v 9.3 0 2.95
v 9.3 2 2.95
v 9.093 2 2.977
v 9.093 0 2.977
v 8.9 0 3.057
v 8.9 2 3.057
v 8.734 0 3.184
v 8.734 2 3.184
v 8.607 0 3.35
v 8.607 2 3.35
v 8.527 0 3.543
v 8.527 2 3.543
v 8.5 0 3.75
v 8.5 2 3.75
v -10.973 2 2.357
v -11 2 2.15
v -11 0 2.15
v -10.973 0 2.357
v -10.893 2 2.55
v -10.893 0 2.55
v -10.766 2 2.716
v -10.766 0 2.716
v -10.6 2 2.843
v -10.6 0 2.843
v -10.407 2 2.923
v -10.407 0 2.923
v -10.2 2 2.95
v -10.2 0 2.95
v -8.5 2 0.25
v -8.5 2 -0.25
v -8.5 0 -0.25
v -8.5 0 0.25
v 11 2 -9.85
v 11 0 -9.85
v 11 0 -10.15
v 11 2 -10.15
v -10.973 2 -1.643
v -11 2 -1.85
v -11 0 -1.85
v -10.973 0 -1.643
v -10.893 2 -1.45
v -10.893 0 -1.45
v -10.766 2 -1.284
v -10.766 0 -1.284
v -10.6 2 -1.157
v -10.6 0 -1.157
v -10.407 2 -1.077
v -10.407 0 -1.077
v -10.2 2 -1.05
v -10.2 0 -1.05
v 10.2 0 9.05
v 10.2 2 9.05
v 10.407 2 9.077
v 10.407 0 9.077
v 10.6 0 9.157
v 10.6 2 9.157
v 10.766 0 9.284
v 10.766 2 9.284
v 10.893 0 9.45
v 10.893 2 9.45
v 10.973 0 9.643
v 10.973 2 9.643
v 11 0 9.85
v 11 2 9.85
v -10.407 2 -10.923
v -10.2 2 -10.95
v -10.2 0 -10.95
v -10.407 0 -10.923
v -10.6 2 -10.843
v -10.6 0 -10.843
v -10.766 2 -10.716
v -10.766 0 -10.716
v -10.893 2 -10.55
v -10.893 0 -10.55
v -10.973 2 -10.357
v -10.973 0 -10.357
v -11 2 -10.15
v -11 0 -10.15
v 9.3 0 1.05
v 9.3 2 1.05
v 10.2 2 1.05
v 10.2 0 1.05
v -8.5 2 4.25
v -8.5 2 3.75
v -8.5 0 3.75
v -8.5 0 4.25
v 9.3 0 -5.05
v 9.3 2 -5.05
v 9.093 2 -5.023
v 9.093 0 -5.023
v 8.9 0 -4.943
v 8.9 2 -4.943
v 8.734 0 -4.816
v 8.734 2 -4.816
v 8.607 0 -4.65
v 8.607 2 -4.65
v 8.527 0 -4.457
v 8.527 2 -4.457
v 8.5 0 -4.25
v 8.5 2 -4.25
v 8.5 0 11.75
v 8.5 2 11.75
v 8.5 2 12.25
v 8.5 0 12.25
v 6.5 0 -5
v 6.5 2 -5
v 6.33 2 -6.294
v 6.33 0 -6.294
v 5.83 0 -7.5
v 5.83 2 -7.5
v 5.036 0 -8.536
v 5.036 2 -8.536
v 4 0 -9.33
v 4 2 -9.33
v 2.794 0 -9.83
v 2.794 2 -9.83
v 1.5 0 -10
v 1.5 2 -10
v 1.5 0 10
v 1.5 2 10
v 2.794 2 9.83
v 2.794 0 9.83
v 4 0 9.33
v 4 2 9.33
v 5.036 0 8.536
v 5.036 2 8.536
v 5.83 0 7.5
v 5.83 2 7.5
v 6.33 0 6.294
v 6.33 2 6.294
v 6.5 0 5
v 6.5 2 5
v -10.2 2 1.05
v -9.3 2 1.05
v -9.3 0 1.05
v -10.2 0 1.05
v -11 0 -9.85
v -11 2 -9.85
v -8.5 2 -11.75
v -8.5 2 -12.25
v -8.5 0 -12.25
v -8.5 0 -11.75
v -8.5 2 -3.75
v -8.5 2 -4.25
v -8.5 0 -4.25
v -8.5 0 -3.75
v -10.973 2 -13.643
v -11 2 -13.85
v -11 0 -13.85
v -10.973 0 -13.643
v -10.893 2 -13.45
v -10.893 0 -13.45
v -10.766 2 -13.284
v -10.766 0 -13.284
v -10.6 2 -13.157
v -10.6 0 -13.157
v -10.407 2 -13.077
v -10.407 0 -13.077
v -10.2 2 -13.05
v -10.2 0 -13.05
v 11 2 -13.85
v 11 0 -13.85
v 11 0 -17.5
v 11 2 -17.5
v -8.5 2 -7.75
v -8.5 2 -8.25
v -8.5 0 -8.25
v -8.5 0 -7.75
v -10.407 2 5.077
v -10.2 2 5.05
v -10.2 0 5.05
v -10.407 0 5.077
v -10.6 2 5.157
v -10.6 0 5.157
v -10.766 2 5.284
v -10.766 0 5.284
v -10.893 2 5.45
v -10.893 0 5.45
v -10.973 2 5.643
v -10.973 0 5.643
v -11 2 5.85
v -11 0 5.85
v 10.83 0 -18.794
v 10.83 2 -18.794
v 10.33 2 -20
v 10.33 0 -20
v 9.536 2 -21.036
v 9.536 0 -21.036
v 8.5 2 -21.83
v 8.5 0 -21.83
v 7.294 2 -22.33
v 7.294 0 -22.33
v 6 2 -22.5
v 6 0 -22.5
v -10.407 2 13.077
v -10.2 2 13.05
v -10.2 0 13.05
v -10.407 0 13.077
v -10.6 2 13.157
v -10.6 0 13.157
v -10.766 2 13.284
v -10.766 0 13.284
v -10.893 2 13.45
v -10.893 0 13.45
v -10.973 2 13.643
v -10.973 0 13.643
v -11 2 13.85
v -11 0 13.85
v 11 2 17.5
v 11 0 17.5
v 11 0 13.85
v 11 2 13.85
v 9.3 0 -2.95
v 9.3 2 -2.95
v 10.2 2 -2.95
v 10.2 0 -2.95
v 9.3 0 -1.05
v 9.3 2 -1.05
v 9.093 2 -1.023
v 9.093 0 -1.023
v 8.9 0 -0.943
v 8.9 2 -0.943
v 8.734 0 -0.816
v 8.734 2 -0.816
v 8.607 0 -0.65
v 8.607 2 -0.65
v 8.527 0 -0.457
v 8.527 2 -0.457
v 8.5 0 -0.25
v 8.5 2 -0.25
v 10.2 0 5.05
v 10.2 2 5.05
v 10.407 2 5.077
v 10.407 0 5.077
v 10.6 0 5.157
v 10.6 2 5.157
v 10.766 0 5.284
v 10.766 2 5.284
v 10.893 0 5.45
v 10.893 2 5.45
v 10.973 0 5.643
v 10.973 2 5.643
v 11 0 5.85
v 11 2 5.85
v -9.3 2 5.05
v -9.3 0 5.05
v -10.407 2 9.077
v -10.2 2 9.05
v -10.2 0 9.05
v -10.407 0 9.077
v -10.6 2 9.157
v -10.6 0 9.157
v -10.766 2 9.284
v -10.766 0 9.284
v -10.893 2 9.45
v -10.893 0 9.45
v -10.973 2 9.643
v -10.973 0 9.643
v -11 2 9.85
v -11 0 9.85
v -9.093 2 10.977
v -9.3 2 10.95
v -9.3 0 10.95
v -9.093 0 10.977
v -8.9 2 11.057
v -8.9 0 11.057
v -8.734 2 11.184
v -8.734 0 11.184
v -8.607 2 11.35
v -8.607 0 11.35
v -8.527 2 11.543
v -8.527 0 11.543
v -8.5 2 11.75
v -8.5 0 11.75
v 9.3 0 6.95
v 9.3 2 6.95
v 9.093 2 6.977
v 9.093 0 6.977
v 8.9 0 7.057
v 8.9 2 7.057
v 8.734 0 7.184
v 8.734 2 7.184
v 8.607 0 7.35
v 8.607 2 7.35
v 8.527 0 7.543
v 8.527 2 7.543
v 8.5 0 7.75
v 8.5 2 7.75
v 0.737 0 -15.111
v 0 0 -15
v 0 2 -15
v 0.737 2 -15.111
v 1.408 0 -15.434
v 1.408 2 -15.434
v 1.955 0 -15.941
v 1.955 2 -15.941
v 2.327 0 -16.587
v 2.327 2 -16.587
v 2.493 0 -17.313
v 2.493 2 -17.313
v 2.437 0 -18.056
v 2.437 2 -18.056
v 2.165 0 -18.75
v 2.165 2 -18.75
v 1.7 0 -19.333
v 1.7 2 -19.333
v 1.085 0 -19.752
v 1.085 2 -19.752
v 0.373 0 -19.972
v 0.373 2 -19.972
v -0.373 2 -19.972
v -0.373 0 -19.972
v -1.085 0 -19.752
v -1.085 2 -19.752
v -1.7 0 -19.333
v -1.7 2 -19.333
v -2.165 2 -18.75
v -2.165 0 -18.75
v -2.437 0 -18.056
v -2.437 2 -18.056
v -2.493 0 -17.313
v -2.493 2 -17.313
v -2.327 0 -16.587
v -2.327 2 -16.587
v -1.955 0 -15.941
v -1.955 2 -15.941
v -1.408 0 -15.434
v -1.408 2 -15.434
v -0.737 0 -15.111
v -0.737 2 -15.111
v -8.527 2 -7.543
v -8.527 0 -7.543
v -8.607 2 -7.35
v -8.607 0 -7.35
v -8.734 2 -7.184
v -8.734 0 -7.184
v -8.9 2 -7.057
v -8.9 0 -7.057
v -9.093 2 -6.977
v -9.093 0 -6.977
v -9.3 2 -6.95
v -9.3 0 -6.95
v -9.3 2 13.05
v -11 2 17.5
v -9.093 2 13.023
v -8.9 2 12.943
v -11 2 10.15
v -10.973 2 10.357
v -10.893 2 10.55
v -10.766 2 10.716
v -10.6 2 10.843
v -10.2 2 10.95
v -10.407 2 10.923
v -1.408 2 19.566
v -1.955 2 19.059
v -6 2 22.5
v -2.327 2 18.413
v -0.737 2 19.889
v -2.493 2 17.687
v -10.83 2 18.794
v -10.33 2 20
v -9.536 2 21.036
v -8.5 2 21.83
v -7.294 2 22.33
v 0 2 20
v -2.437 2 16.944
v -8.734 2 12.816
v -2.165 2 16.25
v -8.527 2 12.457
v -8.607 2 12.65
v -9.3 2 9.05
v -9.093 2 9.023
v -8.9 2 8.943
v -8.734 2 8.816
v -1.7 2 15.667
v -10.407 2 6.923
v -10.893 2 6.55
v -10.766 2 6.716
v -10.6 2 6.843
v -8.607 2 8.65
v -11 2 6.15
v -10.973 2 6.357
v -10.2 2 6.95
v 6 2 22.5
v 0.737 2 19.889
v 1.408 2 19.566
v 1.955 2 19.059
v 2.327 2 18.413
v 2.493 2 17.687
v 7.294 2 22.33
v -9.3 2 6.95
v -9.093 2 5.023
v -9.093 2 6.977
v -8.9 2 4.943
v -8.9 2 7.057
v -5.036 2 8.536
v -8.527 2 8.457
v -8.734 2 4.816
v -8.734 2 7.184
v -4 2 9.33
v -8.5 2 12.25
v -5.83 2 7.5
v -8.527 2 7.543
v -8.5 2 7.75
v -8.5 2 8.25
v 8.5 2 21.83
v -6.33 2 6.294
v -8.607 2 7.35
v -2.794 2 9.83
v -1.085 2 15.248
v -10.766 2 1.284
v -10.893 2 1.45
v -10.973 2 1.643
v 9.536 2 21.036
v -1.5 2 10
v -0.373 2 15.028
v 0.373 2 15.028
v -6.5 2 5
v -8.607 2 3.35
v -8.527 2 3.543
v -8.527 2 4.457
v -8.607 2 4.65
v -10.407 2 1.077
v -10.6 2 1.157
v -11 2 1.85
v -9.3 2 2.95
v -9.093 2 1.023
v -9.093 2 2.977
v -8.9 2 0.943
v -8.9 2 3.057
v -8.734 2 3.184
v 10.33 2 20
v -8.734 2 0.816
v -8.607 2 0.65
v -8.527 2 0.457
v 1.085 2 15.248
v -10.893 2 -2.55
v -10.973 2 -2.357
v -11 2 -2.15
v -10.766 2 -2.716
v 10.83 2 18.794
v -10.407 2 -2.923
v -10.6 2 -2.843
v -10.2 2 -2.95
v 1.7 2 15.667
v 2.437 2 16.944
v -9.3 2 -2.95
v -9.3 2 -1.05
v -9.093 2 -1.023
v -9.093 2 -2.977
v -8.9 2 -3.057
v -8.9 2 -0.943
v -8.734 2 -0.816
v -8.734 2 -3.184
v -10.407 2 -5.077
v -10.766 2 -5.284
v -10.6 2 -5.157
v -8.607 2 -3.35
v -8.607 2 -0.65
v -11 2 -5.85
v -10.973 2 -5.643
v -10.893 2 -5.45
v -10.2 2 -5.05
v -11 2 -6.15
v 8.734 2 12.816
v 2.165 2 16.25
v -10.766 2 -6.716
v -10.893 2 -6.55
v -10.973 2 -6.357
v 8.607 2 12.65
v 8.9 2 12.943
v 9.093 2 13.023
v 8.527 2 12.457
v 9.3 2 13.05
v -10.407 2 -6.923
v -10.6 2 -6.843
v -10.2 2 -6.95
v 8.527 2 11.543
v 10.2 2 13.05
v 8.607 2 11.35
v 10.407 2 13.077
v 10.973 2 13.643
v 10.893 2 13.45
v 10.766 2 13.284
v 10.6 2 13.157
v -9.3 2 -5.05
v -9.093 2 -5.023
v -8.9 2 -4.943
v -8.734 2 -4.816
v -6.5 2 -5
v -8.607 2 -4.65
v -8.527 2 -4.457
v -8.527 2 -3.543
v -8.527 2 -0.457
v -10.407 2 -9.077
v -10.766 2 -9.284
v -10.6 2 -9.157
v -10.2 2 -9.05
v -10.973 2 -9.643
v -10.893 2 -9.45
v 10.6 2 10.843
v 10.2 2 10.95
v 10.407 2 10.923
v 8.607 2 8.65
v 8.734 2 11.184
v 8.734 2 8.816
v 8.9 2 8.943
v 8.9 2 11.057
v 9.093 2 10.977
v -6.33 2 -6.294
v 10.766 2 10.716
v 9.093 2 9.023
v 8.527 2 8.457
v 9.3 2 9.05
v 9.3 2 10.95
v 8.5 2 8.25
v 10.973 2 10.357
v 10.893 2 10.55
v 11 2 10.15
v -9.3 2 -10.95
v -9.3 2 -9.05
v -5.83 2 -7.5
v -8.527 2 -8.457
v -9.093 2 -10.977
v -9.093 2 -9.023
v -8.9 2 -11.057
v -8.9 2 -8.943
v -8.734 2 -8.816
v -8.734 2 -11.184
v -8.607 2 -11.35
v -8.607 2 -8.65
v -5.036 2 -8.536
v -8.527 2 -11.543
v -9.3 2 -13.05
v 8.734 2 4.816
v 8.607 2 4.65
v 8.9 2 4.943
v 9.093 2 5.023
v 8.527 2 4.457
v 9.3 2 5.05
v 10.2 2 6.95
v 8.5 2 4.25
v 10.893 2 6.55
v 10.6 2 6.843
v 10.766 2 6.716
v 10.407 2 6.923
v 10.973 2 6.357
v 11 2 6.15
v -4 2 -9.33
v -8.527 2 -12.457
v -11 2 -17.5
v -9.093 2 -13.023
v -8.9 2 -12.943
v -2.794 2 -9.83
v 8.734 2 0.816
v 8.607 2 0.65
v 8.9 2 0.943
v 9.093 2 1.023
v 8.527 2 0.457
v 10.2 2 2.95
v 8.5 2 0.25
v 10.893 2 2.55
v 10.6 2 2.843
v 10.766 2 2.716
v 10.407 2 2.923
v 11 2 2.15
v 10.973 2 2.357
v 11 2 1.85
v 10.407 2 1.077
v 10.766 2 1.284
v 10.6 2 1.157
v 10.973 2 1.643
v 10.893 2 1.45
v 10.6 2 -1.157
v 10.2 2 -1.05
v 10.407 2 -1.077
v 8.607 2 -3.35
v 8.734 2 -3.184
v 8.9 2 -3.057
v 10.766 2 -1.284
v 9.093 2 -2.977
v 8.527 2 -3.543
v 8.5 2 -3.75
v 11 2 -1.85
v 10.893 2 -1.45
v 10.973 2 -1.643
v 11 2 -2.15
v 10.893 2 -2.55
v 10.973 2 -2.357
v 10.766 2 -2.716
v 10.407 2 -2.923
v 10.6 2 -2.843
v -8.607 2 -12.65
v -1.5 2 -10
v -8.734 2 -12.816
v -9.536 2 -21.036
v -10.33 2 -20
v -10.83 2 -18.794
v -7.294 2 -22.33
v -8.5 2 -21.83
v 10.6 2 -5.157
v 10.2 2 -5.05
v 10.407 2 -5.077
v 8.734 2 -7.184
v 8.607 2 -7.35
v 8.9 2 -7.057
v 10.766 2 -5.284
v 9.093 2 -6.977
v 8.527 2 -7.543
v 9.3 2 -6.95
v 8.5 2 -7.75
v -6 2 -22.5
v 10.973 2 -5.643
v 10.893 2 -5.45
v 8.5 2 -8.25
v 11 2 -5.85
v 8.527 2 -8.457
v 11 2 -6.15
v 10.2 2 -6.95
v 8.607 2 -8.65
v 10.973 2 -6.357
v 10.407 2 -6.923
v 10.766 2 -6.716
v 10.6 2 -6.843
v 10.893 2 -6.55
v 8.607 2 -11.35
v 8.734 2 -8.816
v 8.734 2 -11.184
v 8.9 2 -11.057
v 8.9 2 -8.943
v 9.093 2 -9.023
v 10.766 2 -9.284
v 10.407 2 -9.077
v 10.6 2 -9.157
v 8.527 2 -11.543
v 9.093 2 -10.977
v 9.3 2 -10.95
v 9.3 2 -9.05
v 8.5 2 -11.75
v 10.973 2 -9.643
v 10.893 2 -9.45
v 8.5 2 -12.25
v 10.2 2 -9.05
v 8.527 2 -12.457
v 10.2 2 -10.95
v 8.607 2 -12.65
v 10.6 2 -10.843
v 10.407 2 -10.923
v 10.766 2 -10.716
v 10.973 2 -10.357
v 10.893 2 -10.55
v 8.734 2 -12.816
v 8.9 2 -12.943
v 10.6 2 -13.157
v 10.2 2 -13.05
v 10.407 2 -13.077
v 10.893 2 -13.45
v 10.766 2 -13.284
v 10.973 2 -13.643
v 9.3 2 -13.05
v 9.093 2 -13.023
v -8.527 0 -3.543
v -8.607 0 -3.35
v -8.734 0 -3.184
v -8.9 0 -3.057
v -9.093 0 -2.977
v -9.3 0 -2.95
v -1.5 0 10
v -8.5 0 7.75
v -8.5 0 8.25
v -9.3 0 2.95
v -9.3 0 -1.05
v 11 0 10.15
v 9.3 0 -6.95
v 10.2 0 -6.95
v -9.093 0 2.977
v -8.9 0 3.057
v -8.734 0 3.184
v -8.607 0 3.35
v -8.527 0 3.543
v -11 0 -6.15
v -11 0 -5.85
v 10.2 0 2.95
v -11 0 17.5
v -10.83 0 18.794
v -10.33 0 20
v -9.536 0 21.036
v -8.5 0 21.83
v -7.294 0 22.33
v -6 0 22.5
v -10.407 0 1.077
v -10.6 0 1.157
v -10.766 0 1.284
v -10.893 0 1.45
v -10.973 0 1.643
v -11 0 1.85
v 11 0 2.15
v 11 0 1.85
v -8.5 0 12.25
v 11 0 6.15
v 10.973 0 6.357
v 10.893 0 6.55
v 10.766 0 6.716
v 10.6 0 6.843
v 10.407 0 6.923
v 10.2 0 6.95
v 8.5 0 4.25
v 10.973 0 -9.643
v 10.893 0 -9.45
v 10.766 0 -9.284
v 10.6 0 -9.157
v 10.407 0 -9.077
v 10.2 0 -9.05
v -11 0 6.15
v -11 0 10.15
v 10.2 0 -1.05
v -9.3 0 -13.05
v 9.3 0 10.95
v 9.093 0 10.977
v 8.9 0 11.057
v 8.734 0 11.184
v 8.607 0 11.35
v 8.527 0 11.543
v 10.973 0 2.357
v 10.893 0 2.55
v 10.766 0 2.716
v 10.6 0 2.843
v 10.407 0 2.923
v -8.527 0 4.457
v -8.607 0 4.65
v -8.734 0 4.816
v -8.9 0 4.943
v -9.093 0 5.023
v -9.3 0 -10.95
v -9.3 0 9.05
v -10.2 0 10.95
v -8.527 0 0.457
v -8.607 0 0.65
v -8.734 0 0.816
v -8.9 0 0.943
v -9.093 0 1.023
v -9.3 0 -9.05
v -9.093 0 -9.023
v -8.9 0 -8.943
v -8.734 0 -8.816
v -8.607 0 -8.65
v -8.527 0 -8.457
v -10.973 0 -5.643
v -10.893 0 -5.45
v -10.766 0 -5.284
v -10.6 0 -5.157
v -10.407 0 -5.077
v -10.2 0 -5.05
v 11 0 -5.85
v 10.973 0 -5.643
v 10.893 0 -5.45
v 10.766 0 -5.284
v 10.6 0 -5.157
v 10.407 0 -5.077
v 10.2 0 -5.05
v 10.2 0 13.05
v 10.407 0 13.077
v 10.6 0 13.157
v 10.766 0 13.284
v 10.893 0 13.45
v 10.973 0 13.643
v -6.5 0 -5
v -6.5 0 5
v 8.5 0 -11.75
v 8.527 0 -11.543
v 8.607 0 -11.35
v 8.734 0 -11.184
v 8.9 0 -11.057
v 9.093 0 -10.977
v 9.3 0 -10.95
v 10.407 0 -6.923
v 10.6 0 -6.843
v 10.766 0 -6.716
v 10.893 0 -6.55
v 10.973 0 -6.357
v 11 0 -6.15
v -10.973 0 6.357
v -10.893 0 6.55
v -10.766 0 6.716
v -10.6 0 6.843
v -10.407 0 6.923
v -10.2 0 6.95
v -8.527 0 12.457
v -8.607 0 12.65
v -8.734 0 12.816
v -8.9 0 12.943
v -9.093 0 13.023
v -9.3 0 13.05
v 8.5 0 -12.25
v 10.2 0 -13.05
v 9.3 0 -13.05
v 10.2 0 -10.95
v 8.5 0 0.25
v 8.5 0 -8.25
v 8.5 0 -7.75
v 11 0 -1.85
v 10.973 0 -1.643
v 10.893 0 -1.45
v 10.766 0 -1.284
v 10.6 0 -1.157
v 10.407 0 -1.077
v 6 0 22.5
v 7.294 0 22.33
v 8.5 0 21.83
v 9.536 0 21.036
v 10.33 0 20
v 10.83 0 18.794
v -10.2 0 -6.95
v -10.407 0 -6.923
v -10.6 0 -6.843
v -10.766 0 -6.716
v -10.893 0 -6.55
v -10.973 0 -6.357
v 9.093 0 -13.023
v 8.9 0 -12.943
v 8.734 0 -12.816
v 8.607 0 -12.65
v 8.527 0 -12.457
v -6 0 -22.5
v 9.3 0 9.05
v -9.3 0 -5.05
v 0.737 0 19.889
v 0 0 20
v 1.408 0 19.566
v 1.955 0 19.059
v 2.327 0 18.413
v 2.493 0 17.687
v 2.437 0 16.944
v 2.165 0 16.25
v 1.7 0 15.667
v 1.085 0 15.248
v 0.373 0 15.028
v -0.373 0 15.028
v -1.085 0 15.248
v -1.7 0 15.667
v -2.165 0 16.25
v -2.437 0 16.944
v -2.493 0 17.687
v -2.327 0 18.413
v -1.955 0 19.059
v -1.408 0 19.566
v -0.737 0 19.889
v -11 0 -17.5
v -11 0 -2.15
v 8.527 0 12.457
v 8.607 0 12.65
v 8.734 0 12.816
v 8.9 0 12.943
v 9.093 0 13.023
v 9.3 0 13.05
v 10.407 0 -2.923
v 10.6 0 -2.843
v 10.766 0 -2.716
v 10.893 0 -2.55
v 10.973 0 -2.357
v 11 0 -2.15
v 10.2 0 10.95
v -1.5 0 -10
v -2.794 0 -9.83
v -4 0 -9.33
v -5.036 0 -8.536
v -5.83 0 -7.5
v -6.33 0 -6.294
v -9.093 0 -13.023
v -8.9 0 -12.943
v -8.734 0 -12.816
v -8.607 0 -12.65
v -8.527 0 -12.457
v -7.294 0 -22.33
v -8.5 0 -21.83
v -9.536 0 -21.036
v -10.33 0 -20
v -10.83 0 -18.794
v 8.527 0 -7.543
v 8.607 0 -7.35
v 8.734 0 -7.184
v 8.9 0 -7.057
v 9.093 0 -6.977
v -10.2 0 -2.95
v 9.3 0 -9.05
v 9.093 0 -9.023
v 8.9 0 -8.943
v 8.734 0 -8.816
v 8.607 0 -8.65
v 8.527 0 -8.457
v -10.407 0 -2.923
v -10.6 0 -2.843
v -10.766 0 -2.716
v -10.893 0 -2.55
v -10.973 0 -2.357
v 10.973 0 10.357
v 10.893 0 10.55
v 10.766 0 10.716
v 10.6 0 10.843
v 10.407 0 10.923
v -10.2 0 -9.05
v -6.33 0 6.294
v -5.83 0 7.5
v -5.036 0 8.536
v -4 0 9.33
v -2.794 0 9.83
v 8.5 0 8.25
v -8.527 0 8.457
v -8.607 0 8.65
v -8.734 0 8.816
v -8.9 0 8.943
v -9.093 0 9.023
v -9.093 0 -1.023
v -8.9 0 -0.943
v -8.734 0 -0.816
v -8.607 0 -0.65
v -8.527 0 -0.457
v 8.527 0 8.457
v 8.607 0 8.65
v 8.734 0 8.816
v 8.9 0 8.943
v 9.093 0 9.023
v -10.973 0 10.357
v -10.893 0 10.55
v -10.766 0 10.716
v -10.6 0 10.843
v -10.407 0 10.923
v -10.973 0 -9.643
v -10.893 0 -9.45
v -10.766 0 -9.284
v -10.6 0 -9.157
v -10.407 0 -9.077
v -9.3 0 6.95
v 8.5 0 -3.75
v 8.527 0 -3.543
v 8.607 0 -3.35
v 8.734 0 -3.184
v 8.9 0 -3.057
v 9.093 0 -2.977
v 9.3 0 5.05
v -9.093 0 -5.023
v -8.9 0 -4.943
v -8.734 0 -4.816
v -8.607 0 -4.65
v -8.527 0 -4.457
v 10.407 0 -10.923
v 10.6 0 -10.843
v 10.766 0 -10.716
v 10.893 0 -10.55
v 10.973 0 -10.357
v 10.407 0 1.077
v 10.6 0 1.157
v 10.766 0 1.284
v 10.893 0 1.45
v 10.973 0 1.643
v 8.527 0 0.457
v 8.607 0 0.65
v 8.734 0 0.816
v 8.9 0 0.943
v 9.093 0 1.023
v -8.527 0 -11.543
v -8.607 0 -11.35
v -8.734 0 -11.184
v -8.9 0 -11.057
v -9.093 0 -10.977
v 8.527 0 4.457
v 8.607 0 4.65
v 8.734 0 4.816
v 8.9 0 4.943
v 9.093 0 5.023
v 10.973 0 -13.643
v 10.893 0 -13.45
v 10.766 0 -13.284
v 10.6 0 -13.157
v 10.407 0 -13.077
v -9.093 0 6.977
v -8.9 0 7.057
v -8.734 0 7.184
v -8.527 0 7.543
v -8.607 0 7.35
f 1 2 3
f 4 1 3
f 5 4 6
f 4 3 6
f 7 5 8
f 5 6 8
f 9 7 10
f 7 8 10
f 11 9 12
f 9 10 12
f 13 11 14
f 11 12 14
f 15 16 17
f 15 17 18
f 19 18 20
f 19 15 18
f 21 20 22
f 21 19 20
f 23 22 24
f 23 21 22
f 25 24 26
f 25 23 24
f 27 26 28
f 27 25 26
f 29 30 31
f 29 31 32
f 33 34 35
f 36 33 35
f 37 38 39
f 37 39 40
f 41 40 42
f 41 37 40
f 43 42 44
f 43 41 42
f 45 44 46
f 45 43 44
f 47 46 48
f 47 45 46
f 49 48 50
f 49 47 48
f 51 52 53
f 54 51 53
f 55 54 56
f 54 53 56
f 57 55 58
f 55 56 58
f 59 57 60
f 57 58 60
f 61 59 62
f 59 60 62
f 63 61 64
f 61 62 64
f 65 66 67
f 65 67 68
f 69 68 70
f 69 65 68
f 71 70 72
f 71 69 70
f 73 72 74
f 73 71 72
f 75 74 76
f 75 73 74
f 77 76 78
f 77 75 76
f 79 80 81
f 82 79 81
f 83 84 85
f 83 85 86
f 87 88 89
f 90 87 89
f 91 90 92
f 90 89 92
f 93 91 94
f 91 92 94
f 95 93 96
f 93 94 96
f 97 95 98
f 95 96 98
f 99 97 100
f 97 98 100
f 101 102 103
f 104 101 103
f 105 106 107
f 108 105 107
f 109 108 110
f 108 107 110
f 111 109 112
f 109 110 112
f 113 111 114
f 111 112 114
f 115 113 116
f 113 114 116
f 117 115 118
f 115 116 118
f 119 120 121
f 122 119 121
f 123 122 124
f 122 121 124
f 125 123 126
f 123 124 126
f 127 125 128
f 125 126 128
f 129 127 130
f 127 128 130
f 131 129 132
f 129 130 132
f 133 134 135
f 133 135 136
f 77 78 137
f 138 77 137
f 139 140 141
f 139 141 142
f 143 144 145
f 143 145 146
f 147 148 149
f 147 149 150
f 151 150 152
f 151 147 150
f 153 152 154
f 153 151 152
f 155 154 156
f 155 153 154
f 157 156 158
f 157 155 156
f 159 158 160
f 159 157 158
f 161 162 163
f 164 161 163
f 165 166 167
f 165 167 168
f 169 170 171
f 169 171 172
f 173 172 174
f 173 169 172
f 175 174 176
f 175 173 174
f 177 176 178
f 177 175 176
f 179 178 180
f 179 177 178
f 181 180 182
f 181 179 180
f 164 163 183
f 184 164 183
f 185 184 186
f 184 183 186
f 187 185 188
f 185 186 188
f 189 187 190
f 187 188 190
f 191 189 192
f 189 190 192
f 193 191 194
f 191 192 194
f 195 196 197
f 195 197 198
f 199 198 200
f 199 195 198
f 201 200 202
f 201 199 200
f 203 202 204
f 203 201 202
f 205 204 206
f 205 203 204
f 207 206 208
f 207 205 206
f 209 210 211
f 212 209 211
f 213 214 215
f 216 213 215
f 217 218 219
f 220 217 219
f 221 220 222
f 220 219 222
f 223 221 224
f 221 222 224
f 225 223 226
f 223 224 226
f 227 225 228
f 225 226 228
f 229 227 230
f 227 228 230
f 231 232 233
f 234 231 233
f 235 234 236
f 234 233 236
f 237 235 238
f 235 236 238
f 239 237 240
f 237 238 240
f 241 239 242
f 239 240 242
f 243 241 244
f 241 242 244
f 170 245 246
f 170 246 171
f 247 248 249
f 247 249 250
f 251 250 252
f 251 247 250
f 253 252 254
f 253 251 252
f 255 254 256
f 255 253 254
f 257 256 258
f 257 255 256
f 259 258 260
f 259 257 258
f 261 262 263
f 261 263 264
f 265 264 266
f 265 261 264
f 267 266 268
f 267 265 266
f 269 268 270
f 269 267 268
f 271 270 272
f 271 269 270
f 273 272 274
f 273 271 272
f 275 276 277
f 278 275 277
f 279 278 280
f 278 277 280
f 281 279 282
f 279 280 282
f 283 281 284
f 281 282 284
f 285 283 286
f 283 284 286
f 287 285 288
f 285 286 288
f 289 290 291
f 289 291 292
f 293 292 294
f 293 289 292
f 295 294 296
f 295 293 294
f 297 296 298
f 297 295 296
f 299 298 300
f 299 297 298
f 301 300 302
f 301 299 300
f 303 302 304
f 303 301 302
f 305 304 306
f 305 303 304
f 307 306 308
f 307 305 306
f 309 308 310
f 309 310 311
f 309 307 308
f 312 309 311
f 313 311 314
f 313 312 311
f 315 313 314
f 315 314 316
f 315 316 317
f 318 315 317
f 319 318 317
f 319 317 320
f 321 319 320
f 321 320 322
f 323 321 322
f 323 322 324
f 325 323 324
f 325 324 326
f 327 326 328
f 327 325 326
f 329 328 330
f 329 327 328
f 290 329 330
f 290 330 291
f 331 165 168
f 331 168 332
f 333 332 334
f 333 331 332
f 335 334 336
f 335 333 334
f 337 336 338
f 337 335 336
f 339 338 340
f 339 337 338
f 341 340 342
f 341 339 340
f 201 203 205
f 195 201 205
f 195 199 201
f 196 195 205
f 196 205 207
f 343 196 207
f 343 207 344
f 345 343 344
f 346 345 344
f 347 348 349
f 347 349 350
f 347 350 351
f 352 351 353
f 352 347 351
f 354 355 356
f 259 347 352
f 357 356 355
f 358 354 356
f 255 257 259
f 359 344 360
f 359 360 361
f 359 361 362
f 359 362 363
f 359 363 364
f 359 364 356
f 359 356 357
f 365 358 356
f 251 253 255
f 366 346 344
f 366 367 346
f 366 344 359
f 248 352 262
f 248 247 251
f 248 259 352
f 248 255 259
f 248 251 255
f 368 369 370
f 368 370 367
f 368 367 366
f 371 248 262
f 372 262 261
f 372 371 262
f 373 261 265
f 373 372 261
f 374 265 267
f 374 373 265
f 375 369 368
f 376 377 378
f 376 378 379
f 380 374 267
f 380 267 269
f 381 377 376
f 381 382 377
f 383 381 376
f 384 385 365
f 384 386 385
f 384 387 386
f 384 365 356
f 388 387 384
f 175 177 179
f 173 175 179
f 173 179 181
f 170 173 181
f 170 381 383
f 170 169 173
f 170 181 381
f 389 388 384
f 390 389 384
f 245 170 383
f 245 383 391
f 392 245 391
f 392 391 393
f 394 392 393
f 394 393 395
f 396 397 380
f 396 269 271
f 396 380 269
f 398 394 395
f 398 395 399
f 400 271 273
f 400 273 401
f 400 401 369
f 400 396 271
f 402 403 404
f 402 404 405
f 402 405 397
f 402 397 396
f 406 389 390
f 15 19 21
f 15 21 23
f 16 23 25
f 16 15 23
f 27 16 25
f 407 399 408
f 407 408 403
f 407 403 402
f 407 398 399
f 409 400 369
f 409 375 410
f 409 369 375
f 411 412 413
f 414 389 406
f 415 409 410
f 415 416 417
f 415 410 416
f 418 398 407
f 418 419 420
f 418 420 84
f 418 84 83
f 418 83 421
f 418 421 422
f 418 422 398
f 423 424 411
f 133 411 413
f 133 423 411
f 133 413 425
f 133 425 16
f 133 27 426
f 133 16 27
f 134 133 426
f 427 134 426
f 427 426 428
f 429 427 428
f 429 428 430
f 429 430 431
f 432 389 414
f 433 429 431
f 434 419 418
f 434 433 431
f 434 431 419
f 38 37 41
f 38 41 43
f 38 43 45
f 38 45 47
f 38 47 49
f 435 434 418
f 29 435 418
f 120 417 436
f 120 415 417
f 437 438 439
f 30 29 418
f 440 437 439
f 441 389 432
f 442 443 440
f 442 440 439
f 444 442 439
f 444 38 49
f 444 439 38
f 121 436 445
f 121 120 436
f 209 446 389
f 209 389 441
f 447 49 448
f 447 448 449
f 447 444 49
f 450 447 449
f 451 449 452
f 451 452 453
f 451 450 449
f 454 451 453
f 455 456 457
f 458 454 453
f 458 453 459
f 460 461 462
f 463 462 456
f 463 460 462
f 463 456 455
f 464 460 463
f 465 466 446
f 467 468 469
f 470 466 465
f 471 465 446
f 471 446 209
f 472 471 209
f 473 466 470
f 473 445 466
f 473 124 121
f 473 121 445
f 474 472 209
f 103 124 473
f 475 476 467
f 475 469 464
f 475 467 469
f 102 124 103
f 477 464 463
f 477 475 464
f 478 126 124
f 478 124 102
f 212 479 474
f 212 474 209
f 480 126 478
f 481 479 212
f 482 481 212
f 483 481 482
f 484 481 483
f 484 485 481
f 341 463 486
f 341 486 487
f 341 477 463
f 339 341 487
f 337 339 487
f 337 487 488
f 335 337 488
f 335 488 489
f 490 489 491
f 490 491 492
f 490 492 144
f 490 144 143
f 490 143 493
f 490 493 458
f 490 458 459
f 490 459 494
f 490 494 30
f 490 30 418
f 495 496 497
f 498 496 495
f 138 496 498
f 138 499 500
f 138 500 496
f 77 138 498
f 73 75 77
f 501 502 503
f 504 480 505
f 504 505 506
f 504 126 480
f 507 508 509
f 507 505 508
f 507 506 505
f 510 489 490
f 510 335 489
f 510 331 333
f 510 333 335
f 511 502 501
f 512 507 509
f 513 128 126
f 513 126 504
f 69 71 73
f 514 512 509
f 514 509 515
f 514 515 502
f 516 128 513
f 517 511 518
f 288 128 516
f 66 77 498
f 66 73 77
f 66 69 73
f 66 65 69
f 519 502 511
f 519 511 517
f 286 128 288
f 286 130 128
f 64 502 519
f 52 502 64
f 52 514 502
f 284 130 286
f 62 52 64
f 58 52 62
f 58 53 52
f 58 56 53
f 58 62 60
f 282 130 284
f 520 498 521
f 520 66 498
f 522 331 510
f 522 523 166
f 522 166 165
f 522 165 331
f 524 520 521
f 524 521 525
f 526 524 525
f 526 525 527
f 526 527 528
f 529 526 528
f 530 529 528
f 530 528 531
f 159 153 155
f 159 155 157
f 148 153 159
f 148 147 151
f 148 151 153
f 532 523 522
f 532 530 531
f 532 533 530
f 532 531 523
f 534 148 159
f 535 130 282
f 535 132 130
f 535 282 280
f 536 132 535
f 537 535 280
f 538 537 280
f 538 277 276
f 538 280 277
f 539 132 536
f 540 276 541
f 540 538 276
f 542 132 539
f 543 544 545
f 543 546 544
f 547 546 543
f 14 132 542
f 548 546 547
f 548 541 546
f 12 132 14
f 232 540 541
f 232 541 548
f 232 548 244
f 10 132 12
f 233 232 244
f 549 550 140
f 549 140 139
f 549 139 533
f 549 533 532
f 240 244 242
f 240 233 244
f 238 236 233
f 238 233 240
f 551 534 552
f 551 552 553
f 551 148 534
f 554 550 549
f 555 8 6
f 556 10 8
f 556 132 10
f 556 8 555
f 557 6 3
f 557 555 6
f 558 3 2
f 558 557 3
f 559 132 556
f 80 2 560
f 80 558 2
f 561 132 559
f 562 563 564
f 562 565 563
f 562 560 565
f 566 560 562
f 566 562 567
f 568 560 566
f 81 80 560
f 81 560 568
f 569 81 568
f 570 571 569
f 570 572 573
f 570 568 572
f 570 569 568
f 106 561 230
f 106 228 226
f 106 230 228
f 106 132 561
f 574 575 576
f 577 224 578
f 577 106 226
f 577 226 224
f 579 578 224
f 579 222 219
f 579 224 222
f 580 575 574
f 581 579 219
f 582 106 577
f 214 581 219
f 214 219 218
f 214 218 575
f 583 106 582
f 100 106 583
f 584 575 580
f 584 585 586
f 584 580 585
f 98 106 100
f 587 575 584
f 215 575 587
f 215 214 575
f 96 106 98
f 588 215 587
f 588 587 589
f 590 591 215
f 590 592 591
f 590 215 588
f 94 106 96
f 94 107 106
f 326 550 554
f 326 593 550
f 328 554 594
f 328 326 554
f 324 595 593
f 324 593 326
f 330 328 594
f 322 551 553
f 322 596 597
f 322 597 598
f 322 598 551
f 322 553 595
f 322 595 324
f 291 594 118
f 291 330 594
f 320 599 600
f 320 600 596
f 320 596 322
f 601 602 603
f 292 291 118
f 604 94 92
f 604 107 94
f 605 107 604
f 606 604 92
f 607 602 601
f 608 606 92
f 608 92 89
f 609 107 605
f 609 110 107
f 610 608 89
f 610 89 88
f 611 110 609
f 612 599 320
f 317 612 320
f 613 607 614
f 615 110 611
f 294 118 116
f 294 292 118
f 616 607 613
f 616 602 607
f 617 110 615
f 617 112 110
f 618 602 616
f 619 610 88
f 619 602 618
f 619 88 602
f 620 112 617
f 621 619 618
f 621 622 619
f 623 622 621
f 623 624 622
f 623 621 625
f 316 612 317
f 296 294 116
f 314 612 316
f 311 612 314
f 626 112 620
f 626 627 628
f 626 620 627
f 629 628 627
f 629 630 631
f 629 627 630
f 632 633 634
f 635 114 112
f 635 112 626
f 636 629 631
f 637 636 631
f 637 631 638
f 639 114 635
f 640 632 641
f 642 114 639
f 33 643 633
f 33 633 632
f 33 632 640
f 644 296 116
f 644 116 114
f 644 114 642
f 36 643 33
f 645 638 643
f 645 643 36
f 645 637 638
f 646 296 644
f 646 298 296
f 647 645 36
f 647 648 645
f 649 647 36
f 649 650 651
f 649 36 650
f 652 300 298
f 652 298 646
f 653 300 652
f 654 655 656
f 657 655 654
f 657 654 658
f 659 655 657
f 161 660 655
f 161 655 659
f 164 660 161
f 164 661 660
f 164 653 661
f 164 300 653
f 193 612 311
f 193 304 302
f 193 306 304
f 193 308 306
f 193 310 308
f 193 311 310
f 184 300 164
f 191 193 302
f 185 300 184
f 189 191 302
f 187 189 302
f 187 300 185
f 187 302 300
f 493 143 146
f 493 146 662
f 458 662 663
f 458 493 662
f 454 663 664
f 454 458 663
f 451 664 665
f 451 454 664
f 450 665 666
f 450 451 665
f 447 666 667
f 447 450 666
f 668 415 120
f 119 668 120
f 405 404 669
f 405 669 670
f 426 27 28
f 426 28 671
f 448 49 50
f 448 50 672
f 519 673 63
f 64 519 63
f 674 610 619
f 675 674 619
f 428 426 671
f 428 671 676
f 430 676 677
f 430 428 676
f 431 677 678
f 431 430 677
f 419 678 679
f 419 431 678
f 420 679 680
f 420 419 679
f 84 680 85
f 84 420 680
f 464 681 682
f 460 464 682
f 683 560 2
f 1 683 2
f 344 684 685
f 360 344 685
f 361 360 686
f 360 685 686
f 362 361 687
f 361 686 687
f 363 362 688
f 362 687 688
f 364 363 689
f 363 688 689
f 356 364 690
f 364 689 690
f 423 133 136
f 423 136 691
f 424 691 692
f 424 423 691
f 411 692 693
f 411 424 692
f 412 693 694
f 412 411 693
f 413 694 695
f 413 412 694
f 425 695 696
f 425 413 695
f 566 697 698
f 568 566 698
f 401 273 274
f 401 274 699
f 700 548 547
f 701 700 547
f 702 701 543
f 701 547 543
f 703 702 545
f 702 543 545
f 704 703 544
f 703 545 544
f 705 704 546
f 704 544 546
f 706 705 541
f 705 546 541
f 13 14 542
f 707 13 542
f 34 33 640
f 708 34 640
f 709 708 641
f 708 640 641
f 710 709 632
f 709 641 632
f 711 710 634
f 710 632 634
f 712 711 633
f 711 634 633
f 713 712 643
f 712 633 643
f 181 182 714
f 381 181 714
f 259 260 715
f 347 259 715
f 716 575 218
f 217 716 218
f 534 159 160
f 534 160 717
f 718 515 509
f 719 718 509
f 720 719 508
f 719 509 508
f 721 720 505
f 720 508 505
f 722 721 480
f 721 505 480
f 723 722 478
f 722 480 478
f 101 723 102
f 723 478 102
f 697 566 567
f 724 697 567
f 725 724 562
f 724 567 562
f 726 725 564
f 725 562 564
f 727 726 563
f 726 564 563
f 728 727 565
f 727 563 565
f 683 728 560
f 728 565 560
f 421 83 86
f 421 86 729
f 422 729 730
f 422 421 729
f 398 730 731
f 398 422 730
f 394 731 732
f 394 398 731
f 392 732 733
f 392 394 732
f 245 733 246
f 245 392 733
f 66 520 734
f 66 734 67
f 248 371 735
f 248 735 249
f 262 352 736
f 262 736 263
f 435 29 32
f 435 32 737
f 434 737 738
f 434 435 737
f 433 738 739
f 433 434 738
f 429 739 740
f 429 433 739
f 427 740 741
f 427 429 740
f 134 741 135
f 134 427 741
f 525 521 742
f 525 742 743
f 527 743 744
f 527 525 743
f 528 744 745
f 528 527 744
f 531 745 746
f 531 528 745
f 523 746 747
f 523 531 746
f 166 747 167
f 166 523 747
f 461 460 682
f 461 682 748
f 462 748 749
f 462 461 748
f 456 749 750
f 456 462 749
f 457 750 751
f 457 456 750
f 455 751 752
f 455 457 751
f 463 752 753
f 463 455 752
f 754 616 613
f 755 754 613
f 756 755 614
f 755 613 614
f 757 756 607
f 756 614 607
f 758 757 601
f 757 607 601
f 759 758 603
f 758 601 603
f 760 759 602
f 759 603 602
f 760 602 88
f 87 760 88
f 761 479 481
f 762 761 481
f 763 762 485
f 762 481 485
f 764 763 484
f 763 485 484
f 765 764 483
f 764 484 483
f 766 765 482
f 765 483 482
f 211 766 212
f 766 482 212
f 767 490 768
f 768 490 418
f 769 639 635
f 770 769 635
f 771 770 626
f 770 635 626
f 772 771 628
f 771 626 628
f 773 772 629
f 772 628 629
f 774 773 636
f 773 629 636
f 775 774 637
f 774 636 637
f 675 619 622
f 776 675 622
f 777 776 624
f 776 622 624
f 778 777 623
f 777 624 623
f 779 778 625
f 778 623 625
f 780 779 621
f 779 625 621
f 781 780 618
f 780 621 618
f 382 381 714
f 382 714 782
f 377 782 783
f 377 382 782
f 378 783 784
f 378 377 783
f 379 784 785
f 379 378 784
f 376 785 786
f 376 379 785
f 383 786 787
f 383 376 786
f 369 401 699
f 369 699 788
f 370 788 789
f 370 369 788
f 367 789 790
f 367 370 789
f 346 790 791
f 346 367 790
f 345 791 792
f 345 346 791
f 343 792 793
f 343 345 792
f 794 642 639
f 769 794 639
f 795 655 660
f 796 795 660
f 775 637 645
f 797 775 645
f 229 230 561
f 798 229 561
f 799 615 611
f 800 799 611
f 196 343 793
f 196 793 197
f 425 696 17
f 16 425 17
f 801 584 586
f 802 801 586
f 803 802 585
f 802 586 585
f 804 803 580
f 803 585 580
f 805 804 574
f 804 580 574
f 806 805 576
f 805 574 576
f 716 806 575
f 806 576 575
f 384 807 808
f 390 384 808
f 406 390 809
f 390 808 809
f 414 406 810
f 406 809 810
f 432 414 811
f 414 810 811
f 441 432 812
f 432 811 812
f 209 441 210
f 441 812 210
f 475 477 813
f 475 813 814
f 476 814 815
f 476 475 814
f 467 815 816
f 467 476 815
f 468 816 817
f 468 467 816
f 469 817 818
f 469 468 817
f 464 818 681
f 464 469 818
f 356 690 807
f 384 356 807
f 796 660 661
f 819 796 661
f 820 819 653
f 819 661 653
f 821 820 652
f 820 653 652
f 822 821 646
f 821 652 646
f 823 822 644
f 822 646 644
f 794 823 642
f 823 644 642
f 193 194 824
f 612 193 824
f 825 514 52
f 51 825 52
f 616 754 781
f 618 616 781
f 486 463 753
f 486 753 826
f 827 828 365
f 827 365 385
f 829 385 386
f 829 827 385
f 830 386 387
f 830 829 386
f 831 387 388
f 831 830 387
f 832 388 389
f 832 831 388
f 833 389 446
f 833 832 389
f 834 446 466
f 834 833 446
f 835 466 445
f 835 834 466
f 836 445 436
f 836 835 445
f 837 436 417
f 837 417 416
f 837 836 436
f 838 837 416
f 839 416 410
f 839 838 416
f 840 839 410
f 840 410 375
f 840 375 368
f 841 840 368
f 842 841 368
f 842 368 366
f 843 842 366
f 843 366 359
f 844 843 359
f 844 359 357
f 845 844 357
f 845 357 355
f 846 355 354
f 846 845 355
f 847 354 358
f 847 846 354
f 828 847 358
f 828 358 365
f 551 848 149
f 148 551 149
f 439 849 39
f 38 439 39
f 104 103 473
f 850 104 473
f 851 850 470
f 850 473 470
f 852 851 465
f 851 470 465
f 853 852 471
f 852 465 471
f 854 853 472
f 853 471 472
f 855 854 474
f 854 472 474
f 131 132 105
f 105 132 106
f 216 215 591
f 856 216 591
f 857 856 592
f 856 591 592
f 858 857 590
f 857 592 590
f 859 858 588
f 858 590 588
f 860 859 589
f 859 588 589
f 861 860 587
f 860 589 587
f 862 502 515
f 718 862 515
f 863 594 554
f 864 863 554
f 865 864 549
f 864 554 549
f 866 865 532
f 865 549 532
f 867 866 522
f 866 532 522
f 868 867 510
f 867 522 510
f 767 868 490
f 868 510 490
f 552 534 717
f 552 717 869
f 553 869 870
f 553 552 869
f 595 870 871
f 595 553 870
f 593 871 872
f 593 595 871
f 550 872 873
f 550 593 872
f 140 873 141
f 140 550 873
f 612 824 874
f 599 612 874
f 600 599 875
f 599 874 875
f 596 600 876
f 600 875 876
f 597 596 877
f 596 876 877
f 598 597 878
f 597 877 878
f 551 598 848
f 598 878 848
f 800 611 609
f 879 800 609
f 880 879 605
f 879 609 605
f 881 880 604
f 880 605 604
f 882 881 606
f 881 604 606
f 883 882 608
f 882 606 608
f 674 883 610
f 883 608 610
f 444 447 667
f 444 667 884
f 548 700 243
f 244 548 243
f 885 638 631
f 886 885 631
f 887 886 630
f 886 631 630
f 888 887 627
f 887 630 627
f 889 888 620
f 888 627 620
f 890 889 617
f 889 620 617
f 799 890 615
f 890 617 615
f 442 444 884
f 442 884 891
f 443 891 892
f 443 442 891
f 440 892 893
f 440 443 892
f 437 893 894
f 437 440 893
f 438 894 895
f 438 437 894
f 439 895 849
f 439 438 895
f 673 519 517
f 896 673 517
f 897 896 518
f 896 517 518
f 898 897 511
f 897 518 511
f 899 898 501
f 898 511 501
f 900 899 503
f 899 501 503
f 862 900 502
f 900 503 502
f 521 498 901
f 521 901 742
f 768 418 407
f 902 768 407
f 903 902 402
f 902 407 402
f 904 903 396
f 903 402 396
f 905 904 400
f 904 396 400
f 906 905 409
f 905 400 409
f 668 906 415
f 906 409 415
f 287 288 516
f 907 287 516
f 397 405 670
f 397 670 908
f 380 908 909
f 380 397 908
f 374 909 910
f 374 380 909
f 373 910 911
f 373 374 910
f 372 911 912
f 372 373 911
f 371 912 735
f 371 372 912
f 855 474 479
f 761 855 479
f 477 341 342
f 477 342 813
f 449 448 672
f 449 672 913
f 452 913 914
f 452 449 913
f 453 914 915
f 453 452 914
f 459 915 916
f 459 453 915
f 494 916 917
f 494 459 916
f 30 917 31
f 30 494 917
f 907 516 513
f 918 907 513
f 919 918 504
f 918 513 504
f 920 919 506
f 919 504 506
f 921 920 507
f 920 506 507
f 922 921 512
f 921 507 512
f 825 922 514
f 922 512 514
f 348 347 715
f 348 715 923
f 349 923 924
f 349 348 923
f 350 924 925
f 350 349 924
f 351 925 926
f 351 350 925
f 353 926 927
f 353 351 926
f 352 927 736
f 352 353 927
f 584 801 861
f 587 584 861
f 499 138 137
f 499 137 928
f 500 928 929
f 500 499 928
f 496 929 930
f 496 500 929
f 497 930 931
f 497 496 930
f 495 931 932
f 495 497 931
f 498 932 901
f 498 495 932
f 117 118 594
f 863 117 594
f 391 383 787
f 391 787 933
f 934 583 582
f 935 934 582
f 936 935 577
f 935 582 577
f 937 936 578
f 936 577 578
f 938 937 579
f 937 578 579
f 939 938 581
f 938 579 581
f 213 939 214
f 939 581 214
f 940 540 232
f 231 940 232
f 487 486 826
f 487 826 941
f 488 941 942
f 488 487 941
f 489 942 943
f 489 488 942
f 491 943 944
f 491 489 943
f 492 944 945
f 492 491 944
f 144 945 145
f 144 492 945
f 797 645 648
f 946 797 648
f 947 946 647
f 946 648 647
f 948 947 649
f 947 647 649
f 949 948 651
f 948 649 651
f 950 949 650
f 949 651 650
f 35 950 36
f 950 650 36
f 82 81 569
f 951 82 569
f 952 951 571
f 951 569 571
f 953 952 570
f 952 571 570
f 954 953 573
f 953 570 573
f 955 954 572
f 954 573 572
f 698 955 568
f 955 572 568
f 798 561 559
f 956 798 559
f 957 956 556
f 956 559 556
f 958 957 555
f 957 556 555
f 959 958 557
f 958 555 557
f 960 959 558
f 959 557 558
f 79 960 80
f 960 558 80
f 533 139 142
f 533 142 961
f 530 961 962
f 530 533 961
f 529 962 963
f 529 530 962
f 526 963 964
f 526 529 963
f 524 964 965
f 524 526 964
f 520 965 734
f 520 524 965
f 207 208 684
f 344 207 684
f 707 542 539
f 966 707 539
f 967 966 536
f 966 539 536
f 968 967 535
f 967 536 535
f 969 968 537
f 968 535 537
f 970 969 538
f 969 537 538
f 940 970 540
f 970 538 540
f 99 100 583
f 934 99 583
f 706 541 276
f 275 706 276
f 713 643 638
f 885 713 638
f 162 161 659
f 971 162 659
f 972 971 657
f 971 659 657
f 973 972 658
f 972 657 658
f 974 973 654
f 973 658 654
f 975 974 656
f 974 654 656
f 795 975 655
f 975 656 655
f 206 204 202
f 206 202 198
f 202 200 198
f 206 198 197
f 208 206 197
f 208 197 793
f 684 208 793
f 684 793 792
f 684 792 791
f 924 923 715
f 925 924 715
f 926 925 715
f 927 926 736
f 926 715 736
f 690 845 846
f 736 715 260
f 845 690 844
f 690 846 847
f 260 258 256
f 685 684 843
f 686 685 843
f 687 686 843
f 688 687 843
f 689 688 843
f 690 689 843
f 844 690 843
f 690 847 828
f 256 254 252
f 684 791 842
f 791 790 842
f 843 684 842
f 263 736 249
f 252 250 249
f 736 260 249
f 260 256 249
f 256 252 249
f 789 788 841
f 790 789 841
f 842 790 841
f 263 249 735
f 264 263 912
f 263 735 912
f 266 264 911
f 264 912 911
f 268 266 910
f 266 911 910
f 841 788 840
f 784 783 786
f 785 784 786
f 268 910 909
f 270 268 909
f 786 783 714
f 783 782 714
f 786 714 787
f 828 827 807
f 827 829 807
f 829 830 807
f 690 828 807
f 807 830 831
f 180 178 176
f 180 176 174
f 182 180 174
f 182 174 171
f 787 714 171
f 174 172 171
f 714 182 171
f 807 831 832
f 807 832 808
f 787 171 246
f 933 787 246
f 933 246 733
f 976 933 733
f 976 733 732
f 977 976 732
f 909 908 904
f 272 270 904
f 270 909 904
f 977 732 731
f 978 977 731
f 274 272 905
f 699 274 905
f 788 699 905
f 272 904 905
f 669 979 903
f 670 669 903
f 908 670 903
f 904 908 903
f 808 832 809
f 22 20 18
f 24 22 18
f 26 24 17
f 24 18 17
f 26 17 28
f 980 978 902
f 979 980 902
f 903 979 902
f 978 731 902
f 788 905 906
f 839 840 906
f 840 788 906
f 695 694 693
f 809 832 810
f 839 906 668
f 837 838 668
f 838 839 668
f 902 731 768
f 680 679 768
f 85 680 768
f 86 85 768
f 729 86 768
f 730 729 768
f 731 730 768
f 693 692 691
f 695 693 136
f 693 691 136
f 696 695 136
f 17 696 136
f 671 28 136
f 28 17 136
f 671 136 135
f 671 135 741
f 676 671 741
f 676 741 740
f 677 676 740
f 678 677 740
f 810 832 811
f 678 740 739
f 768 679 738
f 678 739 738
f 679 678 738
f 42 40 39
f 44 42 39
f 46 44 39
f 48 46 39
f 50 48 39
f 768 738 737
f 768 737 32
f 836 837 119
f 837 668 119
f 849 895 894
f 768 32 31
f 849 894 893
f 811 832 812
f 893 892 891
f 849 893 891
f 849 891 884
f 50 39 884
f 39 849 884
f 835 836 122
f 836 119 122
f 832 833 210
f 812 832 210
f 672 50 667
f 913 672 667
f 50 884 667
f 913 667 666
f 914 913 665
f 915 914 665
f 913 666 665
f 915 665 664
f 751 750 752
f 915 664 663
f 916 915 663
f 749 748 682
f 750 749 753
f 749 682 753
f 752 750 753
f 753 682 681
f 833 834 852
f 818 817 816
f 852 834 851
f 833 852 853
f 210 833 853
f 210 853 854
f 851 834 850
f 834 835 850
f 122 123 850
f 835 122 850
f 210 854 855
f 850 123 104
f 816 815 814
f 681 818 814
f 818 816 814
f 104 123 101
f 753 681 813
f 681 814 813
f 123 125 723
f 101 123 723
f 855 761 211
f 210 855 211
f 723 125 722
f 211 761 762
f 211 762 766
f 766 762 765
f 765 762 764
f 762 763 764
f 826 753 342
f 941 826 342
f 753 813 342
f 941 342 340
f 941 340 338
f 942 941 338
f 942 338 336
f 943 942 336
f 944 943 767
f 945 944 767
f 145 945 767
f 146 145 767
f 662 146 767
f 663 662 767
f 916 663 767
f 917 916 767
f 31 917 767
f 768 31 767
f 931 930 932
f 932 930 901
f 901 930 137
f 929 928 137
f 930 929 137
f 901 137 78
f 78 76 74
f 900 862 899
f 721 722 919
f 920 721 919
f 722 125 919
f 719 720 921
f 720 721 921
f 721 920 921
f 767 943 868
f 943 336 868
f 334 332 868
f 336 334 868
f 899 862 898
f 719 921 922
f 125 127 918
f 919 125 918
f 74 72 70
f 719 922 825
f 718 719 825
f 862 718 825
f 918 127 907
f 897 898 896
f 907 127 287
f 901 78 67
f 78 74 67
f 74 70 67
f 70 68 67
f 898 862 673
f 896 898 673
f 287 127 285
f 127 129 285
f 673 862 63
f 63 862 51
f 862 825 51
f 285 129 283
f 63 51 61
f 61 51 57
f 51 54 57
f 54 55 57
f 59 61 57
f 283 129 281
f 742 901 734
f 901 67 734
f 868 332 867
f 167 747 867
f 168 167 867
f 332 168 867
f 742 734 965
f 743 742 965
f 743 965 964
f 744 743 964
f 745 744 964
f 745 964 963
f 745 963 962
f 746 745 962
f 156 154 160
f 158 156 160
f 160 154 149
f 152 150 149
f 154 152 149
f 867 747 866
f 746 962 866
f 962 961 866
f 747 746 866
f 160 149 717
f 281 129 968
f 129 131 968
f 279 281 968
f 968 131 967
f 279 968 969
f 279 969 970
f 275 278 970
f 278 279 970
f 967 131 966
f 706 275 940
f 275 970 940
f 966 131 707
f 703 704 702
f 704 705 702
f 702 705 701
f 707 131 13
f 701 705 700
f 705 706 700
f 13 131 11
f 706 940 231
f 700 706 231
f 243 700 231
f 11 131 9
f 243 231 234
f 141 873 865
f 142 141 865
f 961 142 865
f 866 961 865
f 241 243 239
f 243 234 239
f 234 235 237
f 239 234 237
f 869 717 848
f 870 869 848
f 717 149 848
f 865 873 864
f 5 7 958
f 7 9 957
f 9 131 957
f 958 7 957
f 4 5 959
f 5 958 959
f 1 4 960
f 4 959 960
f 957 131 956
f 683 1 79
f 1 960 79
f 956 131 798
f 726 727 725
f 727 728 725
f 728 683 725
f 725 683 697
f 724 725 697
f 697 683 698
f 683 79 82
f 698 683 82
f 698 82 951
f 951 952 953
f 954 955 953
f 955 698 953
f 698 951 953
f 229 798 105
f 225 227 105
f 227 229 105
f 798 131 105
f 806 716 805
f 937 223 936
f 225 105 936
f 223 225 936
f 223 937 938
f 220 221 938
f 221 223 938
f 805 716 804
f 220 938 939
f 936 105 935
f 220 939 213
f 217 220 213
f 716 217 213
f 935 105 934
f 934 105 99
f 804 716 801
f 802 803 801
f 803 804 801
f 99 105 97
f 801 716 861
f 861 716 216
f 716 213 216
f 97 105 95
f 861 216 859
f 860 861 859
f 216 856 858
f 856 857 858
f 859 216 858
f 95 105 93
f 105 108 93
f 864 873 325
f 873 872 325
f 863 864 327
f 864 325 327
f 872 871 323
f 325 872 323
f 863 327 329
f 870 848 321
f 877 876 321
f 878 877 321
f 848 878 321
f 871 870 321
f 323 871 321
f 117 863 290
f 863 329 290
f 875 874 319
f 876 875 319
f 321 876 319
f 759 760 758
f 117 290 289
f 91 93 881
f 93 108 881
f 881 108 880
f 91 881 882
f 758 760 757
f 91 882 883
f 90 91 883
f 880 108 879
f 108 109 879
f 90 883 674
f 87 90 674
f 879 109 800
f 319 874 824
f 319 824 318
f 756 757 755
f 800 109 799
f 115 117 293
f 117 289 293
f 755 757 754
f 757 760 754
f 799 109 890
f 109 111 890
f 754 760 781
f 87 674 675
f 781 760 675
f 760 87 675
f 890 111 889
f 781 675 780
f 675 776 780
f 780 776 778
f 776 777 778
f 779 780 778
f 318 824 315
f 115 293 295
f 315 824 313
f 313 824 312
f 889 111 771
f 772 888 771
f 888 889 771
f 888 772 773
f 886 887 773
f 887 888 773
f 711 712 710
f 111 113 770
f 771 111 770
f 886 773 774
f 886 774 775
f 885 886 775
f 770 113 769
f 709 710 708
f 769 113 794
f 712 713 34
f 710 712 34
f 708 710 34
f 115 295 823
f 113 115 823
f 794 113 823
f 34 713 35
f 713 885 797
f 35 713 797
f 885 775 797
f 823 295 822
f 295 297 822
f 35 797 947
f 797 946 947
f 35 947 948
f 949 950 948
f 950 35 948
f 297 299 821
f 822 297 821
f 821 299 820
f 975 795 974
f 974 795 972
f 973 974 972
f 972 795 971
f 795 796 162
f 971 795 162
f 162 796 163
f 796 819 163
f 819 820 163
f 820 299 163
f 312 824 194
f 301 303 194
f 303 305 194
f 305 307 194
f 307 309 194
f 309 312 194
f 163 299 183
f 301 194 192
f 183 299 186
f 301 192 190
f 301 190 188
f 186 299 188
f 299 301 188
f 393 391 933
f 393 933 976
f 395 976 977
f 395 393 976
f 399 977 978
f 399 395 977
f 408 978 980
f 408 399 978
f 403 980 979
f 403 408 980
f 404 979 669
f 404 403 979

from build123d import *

# Parameters (mm, degrees)
SKETCH1_R            = 2.5
BOSS_EXTRUDE1_DEPTH  = 2
CUT_EXTRUDE1_DEPTH   = 2
LPATTERN2_COUNT      = 4
LPATTERN2_PITCH      = 4
LPATTERN2_COL_COUNT  = 4
LPATTERN2_COL_PITCH  = 4
MIRROR2_COPY_1_DEPTH = 2
MIRROR2_COPY_2_DEPTH = 2
MIRROR2_COPY_3_DEPTH = 2
MIRROR2_COPY_4_DEPTH = 2
MIRROR2_COPY_5_DEPTH = 2
MIRROR2_COPY_6_DEPTH = 2
CUT_EXTRUDE3_DEPTH   = 2


with BuildPart() as part:
    # Sketch1 → Boss-Extrude1 (new body)
    with BuildSketch(Plane(origin=(0, 0, 0), x_dir=(1, 0, 0), z_dir=(0, 1, 0))):
        with BuildLine():
            Line((-6, -22.5), (6, -22.5))
            ThreePointArc((6, -22.5), (9.535533906, -21.035533906), (11, -17.5))
            Line((11, -17.5), (11, 17.5))
            ThreePointArc((11, 17.5), (9.535533906, 21.035533906), (6, 22.5))
            Line((6, 22.5), (-6, 22.5))
            ThreePointArc((-6, 22.5), (-9.535533906, 21.035533906), (-11, 17.5))
            Line((-11, 17.5), (-11, -17.5))
            ThreePointArc((-11, -17.5), (-9.535533906, -21.035533906), (-6, -22.5))
        make_face()
        with Locations(Location((0, 17.5, 0), (0, 0, 270))):
            Circle(SKETCH1_R, mode=Mode.SUBTRACT)
        with Locations(Location((0, -17.5, 0), (0, 0, 270))):
            Circle(SKETCH1_R, mode=Mode.SUBTRACT)
    extrude(amount=BOSS_EXTRUDE1_DEPTH)

    # Sketch2 → Cut-Extrude1 (cut)
    with BuildSketch(Plane(origin=(0, 2, 0), x_dir=(1, 0, 0), z_dir=(0, 1, 0))):
        with BuildLine():
            Line((-11, -1.85), (-11, 1.85))
            ThreePointArc((-11, 1.85), (-10.765685425, 1.284314575), (-10.2, 1.05))
            Line((-10.2, 1.05), (-9.3, 1.05))
            ThreePointArc((-9.3, 1.05), (-8.734314575, 0.815685425), (-8.5, 0.25))
            Line((-8.5, 0.25), (-8.5, -0.25))
            ThreePointArc((-8.5, -0.25), (-8.734314575, -0.815685425), (-9.3, -1.05))
            Line((-9.3, -1.05), (-10.2, -1.05))
            ThreePointArc((-10.2, -1.05), (-10.765685425, -1.284314575), (-11, -1.85))
        make_face()
    cut_extrude1 = extrude(amount=-CUT_EXTRUDE1_DEPTH, mode=Mode.SUBTRACT)

    # LPattern2: Cut-Extrude1 ×4
    with Locations(*[(0, 0, i * LPATTERN2_PITCH) for i in range(1, LPATTERN2_COUNT)]):
        add(cut_extrude1, mode=Mode.SUBTRACT)

    # LPattern2 col: Cut-Extrude1 ×4
    with Locations(*[(0, 0, -i * LPATTERN2_COL_PITCH) for i in range(1, LPATTERN2_COL_COUNT)]):
        add(cut_extrude1, mode=Mode.SUBTRACT)

    # Mirror2: Cut-Extrude1 across plane
    add(cut_extrude1.mirror(Plane(origin=(0, 0, 0), x_dir=(0, 0, 1), z_dir=(1, 0, 0))), mode=Mode.SUBTRACT)

    # Mirror2 copy 1 sketch → Mirror2 copy 1 (cut)
    with BuildSketch(Plane(origin=(0, 2, 4), x_dir=(-1, 0, 0), z_dir=(0, 1, 0))):
        with BuildLine():
            Line((-11, 1.85), (-11, -1.85))
            ThreePointArc((-11, -1.85), (-10.765685425, -1.284314575), (-10.2, -1.05))
            Line((-10.2, -1.05), (-9.3, -1.05))
            ThreePointArc((-9.3, -1.05), (-8.734314575, -0.815685425), (-8.5, -0.25))
            Line((-8.5, -0.25), (-8.5, 0.25))
            ThreePointArc((-8.5, 0.25), (-8.734314575, 0.815685425), (-9.3, 1.05))
            Line((-9.3, 1.05), (-10.2, 1.05))
            ThreePointArc((-10.2, 1.05), (-10.765685425, 1.284314575), (-11, 1.85))
        make_face()
    extrude(amount=-MIRROR2_COPY_1_DEPTH, mode=Mode.SUBTRACT)

    # Mirror2 copy 2 sketch → Mirror2 copy 2 (cut)
    with BuildSketch(Plane(origin=(0, 2, 8), x_dir=(-1, 0, 0), z_dir=(0, 1, 0))):
        with BuildLine():
            Line((-11, 1.85), (-11, -1.85))
            ThreePointArc((-11, -1.85), (-10.765685425, -1.284314575), (-10.2, -1.05))
            Line((-10.2, -1.05), (-9.3, -1.05))
            ThreePointArc((-9.3, -1.05), (-8.734314575, -0.815685425), (-8.5, -0.25))
            Line((-8.5, -0.25), (-8.5, 0.25))
            ThreePointArc((-8.5, 0.25), (-8.734314575, 0.815685425), (-9.3, 1.05))
            Line((-9.3, 1.05), (-10.2, 1.05))
            ThreePointArc((-10.2, 1.05), (-10.765685425, 1.284314575), (-11, 1.85))
        make_face()
    extrude(amount=-MIRROR2_COPY_2_DEPTH, mode=Mode.SUBTRACT)

    # Mirror2 copy 3 sketch → Mirror2 copy 3 (cut)
    with BuildSketch(Plane(origin=(0, 2, 12), x_dir=(-1, 0, 0), z_dir=(0, 1, 0))):
        with BuildLine():
            Line((-11, 1.85), (-11, -1.85))
            ThreePointArc((-11, -1.85), (-10.765685425, -1.284314575), (-10.2, -1.05))
            Line((-10.2, -1.05), (-9.3, -1.05))
            ThreePointArc((-9.3, -1.05), (-8.734314575, -0.815685425), (-8.5, -0.25))
            Line((-8.5, -0.25), (-8.5, 0.25))
            ThreePointArc((-8.5, 0.25), (-8.734314575, 0.815685425), (-9.3, 1.05))
            Line((-9.3, 1.05), (-10.2, 1.05))
            ThreePointArc((-10.2, 1.05), (-10.765685425, 1.284314575), (-11, 1.85))
        make_face()
    extrude(amount=-MIRROR2_COPY_3_DEPTH, mode=Mode.SUBTRACT)

    # Mirror2 copy 4 sketch → Mirror2 copy 4 (cut)
    with BuildSketch(Plane(origin=(0, 2, -4), x_dir=(-1, 0, 0), z_dir=(0, 1, 0))):
        with BuildLine():
            Line((-11, 1.85), (-11, -1.85))
            ThreePointArc((-11, -1.85), (-10.765685425, -1.284314575), (-10.2, -1.05))
            Line((-10.2, -1.05), (-9.3, -1.05))
            ThreePointArc((-9.3, -1.05), (-8.734314575, -0.815685425), (-8.5, -0.25))
            Line((-8.5, -0.25), (-8.5, 0.25))
            ThreePointArc((-8.5, 0.25), (-8.734314575, 0.815685425), (-9.3, 1.05))
            Line((-9.3, 1.05), (-10.2, 1.05))
            ThreePointArc((-10.2, 1.05), (-10.765685425, 1.284314575), (-11, 1.85))
        make_face()
    extrude(amount=-MIRROR2_COPY_4_DEPTH, mode=Mode.SUBTRACT)

    # Mirror2 copy 5 sketch → Mirror2 copy 5 (cut)
    with BuildSketch(Plane(origin=(0, 2, -8), x_dir=(-1, 0, 0), z_dir=(0, 1, 0))):
        with BuildLine():
            Line((-11, 1.85), (-11, -1.85))
            ThreePointArc((-11, -1.85), (-10.765685425, -1.284314575), (-10.2, -1.05))
            Line((-10.2, -1.05), (-9.3, -1.05))
            ThreePointArc((-9.3, -1.05), (-8.734314575, -0.815685425), (-8.5, -0.25))
            Line((-8.5, -0.25), (-8.5, 0.25))
            ThreePointArc((-8.5, 0.25), (-8.734314575, 0.815685425), (-9.3, 1.05))
            Line((-9.3, 1.05), (-10.2, 1.05))
            ThreePointArc((-10.2, 1.05), (-10.765685425, 1.284314575), (-11, 1.85))
        make_face()
    extrude(amount=-MIRROR2_COPY_5_DEPTH, mode=Mode.SUBTRACT)

    # Mirror2 copy 6 sketch → Mirror2 copy 6 (cut)
    with BuildSketch(Plane(origin=(0, 2, -12), x_dir=(-1, 0, 0), z_dir=(0, 1, 0))):
        with BuildLine():
            Line((-11, 1.85), (-11, -1.85))
            ThreePointArc((-11, -1.85), (-10.765685425, -1.284314575), (-10.2, -1.05))
            Line((-10.2, -1.05), (-9.3, -1.05))
            ThreePointArc((-9.3, -1.05), (-8.734314575, -0.815685425), (-8.5, -0.25))
            Line((-8.5, -0.25), (-8.5, 0.25))
            ThreePointArc((-8.5, 0.25), (-8.734314575, 0.815685425), (-9.3, 1.05))
            Line((-9.3, 1.05), (-10.2, 1.05))
            ThreePointArc((-10.2, 1.05), (-10.765685425, 1.284314575), (-11, 1.85))
        make_face()
    extrude(amount=-MIRROR2_COPY_6_DEPTH, mode=Mode.SUBTRACT)

    # Sketch4 → Cut-Extrude3 (cut)
    with BuildSketch(Plane(origin=(0, 2, 0), x_dir=(1, 0, 0), z_dir=(0, 1, 0))):
        with BuildLine():
            Line((-1.5, -10), (1.5, -10))
            ThreePointArc((1.5, -10), (5.035533906, -8.535533906), (6.5, -5))
            Line((6.5, -5), (6.5, 5))
            ThreePointArc((6.5, 5), (5.035533906, 8.535533906), (1.5, 10))
            Line((1.5, 10), (-1.5, 10))
            ThreePointArc((-1.5, 10), (-5.035533906, 8.535533906), (-6.5, 5))
            Line((-6.5, 5), (-6.5, -5))
            ThreePointArc((-6.5, -5), (-5.035533906, -8.535533906), (-1.5, -10))
        make_face()
    extrude(amount=-CUT_EXTRUDE3_DEPTH, mode=Mode.SUBTRACT)


solid = part.part
